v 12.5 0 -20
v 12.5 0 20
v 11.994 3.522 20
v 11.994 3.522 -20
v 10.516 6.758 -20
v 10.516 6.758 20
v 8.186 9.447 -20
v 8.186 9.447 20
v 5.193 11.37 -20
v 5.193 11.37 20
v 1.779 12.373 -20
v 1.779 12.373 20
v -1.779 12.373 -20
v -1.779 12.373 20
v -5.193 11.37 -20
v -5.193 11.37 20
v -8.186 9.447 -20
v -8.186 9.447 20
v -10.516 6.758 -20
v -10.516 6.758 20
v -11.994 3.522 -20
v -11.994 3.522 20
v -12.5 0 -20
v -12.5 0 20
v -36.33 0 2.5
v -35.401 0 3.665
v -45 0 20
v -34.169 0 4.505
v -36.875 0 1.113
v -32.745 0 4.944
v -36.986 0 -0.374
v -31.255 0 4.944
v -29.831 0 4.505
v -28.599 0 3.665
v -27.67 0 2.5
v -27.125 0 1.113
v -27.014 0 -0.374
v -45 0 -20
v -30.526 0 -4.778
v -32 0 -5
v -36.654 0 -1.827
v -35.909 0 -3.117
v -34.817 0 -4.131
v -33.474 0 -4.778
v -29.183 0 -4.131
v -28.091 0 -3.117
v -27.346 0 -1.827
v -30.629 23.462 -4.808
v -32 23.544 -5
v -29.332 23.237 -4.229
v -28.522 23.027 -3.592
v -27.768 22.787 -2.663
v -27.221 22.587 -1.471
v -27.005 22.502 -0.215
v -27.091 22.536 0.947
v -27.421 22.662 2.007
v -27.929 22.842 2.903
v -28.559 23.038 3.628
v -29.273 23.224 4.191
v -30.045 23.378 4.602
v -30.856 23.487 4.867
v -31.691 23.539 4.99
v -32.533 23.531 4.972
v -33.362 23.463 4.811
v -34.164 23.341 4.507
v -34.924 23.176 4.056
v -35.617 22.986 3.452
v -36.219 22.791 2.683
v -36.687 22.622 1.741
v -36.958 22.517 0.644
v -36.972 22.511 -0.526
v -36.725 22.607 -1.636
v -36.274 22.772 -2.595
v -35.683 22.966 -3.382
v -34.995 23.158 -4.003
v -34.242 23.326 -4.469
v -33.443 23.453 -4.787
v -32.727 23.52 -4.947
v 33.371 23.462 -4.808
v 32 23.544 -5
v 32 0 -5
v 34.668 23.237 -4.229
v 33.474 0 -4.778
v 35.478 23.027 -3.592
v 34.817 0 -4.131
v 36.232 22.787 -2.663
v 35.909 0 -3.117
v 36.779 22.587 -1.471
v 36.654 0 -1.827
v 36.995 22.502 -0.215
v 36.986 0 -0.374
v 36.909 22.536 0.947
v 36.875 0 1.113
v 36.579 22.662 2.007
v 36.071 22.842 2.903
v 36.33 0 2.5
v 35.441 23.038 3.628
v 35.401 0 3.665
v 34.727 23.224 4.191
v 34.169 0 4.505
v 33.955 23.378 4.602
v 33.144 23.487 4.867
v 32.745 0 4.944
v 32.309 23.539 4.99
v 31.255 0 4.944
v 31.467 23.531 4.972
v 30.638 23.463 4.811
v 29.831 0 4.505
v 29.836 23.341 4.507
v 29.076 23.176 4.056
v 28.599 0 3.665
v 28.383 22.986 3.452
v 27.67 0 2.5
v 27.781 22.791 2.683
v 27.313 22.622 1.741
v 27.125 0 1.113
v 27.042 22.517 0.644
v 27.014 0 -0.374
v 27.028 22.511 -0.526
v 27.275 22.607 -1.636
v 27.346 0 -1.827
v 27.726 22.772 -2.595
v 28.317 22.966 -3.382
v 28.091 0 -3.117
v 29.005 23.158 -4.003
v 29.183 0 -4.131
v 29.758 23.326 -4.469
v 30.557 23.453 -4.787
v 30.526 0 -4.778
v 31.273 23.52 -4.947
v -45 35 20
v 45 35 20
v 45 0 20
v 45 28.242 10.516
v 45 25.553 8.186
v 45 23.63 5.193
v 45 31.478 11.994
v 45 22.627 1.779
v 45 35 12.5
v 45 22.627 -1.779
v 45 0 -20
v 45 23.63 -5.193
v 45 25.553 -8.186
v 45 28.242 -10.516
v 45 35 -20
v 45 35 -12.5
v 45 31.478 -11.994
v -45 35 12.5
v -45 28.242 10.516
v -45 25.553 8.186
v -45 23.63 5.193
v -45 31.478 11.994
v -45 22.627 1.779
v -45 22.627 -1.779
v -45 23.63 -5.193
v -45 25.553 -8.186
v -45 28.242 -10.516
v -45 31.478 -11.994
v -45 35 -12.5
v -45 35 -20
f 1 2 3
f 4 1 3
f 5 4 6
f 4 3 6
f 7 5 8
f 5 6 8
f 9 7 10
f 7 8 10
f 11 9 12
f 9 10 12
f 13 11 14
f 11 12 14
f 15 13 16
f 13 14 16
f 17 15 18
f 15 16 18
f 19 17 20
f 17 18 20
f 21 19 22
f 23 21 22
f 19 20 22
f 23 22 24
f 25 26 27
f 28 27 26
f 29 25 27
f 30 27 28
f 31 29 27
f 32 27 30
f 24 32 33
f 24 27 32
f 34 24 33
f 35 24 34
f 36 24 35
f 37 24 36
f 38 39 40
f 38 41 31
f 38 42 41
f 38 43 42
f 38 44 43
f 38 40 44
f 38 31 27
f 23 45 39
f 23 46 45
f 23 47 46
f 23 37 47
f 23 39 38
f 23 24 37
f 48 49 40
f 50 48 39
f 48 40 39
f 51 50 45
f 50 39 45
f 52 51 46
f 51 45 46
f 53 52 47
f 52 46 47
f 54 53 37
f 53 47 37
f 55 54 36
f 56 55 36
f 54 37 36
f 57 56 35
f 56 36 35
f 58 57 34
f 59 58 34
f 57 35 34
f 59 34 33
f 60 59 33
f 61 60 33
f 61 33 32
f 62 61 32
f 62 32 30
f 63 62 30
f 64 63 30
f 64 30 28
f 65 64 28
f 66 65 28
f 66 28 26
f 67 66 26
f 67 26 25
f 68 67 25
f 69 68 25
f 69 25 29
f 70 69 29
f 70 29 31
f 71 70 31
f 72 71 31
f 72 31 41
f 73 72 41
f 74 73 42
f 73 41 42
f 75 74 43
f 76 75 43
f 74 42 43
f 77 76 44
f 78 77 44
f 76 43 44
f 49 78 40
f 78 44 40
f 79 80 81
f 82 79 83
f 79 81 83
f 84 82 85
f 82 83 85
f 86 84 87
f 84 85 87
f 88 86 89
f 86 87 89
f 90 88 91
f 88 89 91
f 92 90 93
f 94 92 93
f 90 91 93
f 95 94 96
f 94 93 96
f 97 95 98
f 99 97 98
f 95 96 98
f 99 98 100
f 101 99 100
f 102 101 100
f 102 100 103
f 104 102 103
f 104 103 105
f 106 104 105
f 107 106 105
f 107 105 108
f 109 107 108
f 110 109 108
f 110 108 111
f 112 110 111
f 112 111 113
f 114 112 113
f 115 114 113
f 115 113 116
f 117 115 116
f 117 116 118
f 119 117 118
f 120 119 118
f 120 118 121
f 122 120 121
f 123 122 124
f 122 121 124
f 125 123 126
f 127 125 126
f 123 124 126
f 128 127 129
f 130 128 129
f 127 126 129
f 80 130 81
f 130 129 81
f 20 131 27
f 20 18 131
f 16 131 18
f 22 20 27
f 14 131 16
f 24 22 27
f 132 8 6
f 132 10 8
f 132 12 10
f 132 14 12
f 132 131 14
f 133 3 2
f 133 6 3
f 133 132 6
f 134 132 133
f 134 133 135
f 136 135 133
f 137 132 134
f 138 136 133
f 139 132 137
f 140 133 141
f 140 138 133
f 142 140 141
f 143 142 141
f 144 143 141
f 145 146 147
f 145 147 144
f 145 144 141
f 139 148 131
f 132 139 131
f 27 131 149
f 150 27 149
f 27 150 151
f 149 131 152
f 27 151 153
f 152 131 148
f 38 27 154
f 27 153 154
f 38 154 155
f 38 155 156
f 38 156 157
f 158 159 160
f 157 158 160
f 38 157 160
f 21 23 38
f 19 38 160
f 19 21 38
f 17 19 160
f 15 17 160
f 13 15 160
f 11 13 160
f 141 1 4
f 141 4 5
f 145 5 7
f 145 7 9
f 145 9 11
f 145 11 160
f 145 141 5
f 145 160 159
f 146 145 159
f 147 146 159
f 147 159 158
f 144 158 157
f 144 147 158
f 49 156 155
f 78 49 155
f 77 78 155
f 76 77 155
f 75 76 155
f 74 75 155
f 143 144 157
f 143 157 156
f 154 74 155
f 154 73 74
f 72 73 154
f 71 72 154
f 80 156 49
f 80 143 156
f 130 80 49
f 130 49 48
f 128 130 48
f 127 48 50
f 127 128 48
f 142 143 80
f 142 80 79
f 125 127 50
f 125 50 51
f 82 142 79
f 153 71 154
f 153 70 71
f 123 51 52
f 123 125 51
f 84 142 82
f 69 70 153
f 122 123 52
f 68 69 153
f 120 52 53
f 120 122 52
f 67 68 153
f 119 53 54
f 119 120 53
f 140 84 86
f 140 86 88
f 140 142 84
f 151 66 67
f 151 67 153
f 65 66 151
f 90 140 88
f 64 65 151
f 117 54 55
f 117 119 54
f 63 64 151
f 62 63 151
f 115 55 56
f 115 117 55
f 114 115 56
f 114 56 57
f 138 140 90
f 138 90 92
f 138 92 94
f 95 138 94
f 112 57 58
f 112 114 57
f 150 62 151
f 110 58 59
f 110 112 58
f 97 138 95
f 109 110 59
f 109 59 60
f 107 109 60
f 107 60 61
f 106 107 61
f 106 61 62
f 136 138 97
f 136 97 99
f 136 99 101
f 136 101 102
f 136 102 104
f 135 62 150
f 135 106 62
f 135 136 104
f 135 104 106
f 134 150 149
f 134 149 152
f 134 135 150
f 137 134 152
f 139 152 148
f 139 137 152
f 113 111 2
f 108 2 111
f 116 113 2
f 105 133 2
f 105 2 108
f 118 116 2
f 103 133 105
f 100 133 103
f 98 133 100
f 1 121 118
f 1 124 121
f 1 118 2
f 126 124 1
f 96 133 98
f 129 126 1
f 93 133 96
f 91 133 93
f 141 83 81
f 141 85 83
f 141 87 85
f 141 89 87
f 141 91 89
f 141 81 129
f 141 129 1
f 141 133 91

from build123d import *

# Parameters (mm, degrees)
BOSS_EXTRUDE1_DEPTH     = 45
CUT_EXTRUDE1_REACH      = 71.642
SKETCH2_R               = 12.5
CUT_EXTRUDE2_REACH      = 62.415
CUT_EXTRUDE2_END_RADIUS = 12.5
SKETCH3_R               = 5


with BuildPart() as part:
    # Sketch1 → Boss-Extrude1 (new, symmetric)
    with BuildSketch(Plane(origin=(0, 0, 0), x_dir=(0, 0, -1), z_dir=(1, 0, 0))):
        with BuildLine():
            Line((-20, 0), (20, 0))
            Line((20, 0), (20, 35))
            Line((20, 35), (12.5, 35))
            ThreePointArc((12.5, 35), (0, 22.5), (-12.5, 35))
            Line((-12.5, 35), (-20, 35))
            Line((-20, 35), (-20, 0))
        make_face()
    extrude(amount=BOSS_EXTRUDE1_DEPTH, both=True)

    # Sketch2 → Cut-Extrude1 (cut, up to next)
    with BuildSketch(Plane.XY.offset(20), mode=Mode.PRIVATE) as cut_extrude1_sk1:
        Circle(SKETCH2_R)
    cut_extrude1_tool1 = extrude(cut_extrude1_sk1.sketch, amount=-CUT_EXTRUDE1_REACH, mode=Mode.PRIVATE) & part.part
    add(cut_extrude1_tool1.solids().sort_by_distance((0, 0, 20))[0], mode=Mode.SUBTRACT)

    # Cut-Extrude2: up to this cylinder (the profile starts outside it)
    cut_extrude2_end = Plane(origin=(0, 35, 0), z_dir=(-1, 0, 0)) * Cylinder(CUT_EXTRUDE2_END_RADIUS, 214.83, mode=Mode.PRIVATE)
    # Sketch3 → Cut-Extrude2 (cut, up to the surface)
    with BuildSketch(Plane.XZ, mode=Mode.PRIVATE) as cut_extrude2_sk1:
        with Locations(Location((32, 0, 0), (0, 0, 270))):
            Circle(SKETCH3_R)
    cut_extrude2_tool1 = extrude(cut_extrude2_sk1.sketch, amount=-CUT_EXTRUDE2_REACH, mode=Mode.PRIVATE) - cut_extrude2_end
    add(cut_extrude2_tool1.solids().sort_by_distance((32, 0, 0))[0], mode=Mode.SUBTRACT)
    # Sketch3 → Cut-Extrude2 (cut, up to the surface)
    with BuildSketch(Plane.XZ, mode=Mode.PRIVATE) as cut_extrude2_sk2:
        with Locations(Location((-32, 0, 0), (0, 0, 270))):
            Circle(SKETCH3_R)
    cut_extrude2_tool2 = extrude(cut_extrude2_sk2.sketch, amount=-CUT_EXTRUDE2_REACH, mode=Mode.PRIVATE) - cut_extrude2_end
    add(cut_extrude2_tool2.solids().sort_by_distance((-32, 0, 0))[0], mode=Mode.SUBTRACT)


solid = part.part
